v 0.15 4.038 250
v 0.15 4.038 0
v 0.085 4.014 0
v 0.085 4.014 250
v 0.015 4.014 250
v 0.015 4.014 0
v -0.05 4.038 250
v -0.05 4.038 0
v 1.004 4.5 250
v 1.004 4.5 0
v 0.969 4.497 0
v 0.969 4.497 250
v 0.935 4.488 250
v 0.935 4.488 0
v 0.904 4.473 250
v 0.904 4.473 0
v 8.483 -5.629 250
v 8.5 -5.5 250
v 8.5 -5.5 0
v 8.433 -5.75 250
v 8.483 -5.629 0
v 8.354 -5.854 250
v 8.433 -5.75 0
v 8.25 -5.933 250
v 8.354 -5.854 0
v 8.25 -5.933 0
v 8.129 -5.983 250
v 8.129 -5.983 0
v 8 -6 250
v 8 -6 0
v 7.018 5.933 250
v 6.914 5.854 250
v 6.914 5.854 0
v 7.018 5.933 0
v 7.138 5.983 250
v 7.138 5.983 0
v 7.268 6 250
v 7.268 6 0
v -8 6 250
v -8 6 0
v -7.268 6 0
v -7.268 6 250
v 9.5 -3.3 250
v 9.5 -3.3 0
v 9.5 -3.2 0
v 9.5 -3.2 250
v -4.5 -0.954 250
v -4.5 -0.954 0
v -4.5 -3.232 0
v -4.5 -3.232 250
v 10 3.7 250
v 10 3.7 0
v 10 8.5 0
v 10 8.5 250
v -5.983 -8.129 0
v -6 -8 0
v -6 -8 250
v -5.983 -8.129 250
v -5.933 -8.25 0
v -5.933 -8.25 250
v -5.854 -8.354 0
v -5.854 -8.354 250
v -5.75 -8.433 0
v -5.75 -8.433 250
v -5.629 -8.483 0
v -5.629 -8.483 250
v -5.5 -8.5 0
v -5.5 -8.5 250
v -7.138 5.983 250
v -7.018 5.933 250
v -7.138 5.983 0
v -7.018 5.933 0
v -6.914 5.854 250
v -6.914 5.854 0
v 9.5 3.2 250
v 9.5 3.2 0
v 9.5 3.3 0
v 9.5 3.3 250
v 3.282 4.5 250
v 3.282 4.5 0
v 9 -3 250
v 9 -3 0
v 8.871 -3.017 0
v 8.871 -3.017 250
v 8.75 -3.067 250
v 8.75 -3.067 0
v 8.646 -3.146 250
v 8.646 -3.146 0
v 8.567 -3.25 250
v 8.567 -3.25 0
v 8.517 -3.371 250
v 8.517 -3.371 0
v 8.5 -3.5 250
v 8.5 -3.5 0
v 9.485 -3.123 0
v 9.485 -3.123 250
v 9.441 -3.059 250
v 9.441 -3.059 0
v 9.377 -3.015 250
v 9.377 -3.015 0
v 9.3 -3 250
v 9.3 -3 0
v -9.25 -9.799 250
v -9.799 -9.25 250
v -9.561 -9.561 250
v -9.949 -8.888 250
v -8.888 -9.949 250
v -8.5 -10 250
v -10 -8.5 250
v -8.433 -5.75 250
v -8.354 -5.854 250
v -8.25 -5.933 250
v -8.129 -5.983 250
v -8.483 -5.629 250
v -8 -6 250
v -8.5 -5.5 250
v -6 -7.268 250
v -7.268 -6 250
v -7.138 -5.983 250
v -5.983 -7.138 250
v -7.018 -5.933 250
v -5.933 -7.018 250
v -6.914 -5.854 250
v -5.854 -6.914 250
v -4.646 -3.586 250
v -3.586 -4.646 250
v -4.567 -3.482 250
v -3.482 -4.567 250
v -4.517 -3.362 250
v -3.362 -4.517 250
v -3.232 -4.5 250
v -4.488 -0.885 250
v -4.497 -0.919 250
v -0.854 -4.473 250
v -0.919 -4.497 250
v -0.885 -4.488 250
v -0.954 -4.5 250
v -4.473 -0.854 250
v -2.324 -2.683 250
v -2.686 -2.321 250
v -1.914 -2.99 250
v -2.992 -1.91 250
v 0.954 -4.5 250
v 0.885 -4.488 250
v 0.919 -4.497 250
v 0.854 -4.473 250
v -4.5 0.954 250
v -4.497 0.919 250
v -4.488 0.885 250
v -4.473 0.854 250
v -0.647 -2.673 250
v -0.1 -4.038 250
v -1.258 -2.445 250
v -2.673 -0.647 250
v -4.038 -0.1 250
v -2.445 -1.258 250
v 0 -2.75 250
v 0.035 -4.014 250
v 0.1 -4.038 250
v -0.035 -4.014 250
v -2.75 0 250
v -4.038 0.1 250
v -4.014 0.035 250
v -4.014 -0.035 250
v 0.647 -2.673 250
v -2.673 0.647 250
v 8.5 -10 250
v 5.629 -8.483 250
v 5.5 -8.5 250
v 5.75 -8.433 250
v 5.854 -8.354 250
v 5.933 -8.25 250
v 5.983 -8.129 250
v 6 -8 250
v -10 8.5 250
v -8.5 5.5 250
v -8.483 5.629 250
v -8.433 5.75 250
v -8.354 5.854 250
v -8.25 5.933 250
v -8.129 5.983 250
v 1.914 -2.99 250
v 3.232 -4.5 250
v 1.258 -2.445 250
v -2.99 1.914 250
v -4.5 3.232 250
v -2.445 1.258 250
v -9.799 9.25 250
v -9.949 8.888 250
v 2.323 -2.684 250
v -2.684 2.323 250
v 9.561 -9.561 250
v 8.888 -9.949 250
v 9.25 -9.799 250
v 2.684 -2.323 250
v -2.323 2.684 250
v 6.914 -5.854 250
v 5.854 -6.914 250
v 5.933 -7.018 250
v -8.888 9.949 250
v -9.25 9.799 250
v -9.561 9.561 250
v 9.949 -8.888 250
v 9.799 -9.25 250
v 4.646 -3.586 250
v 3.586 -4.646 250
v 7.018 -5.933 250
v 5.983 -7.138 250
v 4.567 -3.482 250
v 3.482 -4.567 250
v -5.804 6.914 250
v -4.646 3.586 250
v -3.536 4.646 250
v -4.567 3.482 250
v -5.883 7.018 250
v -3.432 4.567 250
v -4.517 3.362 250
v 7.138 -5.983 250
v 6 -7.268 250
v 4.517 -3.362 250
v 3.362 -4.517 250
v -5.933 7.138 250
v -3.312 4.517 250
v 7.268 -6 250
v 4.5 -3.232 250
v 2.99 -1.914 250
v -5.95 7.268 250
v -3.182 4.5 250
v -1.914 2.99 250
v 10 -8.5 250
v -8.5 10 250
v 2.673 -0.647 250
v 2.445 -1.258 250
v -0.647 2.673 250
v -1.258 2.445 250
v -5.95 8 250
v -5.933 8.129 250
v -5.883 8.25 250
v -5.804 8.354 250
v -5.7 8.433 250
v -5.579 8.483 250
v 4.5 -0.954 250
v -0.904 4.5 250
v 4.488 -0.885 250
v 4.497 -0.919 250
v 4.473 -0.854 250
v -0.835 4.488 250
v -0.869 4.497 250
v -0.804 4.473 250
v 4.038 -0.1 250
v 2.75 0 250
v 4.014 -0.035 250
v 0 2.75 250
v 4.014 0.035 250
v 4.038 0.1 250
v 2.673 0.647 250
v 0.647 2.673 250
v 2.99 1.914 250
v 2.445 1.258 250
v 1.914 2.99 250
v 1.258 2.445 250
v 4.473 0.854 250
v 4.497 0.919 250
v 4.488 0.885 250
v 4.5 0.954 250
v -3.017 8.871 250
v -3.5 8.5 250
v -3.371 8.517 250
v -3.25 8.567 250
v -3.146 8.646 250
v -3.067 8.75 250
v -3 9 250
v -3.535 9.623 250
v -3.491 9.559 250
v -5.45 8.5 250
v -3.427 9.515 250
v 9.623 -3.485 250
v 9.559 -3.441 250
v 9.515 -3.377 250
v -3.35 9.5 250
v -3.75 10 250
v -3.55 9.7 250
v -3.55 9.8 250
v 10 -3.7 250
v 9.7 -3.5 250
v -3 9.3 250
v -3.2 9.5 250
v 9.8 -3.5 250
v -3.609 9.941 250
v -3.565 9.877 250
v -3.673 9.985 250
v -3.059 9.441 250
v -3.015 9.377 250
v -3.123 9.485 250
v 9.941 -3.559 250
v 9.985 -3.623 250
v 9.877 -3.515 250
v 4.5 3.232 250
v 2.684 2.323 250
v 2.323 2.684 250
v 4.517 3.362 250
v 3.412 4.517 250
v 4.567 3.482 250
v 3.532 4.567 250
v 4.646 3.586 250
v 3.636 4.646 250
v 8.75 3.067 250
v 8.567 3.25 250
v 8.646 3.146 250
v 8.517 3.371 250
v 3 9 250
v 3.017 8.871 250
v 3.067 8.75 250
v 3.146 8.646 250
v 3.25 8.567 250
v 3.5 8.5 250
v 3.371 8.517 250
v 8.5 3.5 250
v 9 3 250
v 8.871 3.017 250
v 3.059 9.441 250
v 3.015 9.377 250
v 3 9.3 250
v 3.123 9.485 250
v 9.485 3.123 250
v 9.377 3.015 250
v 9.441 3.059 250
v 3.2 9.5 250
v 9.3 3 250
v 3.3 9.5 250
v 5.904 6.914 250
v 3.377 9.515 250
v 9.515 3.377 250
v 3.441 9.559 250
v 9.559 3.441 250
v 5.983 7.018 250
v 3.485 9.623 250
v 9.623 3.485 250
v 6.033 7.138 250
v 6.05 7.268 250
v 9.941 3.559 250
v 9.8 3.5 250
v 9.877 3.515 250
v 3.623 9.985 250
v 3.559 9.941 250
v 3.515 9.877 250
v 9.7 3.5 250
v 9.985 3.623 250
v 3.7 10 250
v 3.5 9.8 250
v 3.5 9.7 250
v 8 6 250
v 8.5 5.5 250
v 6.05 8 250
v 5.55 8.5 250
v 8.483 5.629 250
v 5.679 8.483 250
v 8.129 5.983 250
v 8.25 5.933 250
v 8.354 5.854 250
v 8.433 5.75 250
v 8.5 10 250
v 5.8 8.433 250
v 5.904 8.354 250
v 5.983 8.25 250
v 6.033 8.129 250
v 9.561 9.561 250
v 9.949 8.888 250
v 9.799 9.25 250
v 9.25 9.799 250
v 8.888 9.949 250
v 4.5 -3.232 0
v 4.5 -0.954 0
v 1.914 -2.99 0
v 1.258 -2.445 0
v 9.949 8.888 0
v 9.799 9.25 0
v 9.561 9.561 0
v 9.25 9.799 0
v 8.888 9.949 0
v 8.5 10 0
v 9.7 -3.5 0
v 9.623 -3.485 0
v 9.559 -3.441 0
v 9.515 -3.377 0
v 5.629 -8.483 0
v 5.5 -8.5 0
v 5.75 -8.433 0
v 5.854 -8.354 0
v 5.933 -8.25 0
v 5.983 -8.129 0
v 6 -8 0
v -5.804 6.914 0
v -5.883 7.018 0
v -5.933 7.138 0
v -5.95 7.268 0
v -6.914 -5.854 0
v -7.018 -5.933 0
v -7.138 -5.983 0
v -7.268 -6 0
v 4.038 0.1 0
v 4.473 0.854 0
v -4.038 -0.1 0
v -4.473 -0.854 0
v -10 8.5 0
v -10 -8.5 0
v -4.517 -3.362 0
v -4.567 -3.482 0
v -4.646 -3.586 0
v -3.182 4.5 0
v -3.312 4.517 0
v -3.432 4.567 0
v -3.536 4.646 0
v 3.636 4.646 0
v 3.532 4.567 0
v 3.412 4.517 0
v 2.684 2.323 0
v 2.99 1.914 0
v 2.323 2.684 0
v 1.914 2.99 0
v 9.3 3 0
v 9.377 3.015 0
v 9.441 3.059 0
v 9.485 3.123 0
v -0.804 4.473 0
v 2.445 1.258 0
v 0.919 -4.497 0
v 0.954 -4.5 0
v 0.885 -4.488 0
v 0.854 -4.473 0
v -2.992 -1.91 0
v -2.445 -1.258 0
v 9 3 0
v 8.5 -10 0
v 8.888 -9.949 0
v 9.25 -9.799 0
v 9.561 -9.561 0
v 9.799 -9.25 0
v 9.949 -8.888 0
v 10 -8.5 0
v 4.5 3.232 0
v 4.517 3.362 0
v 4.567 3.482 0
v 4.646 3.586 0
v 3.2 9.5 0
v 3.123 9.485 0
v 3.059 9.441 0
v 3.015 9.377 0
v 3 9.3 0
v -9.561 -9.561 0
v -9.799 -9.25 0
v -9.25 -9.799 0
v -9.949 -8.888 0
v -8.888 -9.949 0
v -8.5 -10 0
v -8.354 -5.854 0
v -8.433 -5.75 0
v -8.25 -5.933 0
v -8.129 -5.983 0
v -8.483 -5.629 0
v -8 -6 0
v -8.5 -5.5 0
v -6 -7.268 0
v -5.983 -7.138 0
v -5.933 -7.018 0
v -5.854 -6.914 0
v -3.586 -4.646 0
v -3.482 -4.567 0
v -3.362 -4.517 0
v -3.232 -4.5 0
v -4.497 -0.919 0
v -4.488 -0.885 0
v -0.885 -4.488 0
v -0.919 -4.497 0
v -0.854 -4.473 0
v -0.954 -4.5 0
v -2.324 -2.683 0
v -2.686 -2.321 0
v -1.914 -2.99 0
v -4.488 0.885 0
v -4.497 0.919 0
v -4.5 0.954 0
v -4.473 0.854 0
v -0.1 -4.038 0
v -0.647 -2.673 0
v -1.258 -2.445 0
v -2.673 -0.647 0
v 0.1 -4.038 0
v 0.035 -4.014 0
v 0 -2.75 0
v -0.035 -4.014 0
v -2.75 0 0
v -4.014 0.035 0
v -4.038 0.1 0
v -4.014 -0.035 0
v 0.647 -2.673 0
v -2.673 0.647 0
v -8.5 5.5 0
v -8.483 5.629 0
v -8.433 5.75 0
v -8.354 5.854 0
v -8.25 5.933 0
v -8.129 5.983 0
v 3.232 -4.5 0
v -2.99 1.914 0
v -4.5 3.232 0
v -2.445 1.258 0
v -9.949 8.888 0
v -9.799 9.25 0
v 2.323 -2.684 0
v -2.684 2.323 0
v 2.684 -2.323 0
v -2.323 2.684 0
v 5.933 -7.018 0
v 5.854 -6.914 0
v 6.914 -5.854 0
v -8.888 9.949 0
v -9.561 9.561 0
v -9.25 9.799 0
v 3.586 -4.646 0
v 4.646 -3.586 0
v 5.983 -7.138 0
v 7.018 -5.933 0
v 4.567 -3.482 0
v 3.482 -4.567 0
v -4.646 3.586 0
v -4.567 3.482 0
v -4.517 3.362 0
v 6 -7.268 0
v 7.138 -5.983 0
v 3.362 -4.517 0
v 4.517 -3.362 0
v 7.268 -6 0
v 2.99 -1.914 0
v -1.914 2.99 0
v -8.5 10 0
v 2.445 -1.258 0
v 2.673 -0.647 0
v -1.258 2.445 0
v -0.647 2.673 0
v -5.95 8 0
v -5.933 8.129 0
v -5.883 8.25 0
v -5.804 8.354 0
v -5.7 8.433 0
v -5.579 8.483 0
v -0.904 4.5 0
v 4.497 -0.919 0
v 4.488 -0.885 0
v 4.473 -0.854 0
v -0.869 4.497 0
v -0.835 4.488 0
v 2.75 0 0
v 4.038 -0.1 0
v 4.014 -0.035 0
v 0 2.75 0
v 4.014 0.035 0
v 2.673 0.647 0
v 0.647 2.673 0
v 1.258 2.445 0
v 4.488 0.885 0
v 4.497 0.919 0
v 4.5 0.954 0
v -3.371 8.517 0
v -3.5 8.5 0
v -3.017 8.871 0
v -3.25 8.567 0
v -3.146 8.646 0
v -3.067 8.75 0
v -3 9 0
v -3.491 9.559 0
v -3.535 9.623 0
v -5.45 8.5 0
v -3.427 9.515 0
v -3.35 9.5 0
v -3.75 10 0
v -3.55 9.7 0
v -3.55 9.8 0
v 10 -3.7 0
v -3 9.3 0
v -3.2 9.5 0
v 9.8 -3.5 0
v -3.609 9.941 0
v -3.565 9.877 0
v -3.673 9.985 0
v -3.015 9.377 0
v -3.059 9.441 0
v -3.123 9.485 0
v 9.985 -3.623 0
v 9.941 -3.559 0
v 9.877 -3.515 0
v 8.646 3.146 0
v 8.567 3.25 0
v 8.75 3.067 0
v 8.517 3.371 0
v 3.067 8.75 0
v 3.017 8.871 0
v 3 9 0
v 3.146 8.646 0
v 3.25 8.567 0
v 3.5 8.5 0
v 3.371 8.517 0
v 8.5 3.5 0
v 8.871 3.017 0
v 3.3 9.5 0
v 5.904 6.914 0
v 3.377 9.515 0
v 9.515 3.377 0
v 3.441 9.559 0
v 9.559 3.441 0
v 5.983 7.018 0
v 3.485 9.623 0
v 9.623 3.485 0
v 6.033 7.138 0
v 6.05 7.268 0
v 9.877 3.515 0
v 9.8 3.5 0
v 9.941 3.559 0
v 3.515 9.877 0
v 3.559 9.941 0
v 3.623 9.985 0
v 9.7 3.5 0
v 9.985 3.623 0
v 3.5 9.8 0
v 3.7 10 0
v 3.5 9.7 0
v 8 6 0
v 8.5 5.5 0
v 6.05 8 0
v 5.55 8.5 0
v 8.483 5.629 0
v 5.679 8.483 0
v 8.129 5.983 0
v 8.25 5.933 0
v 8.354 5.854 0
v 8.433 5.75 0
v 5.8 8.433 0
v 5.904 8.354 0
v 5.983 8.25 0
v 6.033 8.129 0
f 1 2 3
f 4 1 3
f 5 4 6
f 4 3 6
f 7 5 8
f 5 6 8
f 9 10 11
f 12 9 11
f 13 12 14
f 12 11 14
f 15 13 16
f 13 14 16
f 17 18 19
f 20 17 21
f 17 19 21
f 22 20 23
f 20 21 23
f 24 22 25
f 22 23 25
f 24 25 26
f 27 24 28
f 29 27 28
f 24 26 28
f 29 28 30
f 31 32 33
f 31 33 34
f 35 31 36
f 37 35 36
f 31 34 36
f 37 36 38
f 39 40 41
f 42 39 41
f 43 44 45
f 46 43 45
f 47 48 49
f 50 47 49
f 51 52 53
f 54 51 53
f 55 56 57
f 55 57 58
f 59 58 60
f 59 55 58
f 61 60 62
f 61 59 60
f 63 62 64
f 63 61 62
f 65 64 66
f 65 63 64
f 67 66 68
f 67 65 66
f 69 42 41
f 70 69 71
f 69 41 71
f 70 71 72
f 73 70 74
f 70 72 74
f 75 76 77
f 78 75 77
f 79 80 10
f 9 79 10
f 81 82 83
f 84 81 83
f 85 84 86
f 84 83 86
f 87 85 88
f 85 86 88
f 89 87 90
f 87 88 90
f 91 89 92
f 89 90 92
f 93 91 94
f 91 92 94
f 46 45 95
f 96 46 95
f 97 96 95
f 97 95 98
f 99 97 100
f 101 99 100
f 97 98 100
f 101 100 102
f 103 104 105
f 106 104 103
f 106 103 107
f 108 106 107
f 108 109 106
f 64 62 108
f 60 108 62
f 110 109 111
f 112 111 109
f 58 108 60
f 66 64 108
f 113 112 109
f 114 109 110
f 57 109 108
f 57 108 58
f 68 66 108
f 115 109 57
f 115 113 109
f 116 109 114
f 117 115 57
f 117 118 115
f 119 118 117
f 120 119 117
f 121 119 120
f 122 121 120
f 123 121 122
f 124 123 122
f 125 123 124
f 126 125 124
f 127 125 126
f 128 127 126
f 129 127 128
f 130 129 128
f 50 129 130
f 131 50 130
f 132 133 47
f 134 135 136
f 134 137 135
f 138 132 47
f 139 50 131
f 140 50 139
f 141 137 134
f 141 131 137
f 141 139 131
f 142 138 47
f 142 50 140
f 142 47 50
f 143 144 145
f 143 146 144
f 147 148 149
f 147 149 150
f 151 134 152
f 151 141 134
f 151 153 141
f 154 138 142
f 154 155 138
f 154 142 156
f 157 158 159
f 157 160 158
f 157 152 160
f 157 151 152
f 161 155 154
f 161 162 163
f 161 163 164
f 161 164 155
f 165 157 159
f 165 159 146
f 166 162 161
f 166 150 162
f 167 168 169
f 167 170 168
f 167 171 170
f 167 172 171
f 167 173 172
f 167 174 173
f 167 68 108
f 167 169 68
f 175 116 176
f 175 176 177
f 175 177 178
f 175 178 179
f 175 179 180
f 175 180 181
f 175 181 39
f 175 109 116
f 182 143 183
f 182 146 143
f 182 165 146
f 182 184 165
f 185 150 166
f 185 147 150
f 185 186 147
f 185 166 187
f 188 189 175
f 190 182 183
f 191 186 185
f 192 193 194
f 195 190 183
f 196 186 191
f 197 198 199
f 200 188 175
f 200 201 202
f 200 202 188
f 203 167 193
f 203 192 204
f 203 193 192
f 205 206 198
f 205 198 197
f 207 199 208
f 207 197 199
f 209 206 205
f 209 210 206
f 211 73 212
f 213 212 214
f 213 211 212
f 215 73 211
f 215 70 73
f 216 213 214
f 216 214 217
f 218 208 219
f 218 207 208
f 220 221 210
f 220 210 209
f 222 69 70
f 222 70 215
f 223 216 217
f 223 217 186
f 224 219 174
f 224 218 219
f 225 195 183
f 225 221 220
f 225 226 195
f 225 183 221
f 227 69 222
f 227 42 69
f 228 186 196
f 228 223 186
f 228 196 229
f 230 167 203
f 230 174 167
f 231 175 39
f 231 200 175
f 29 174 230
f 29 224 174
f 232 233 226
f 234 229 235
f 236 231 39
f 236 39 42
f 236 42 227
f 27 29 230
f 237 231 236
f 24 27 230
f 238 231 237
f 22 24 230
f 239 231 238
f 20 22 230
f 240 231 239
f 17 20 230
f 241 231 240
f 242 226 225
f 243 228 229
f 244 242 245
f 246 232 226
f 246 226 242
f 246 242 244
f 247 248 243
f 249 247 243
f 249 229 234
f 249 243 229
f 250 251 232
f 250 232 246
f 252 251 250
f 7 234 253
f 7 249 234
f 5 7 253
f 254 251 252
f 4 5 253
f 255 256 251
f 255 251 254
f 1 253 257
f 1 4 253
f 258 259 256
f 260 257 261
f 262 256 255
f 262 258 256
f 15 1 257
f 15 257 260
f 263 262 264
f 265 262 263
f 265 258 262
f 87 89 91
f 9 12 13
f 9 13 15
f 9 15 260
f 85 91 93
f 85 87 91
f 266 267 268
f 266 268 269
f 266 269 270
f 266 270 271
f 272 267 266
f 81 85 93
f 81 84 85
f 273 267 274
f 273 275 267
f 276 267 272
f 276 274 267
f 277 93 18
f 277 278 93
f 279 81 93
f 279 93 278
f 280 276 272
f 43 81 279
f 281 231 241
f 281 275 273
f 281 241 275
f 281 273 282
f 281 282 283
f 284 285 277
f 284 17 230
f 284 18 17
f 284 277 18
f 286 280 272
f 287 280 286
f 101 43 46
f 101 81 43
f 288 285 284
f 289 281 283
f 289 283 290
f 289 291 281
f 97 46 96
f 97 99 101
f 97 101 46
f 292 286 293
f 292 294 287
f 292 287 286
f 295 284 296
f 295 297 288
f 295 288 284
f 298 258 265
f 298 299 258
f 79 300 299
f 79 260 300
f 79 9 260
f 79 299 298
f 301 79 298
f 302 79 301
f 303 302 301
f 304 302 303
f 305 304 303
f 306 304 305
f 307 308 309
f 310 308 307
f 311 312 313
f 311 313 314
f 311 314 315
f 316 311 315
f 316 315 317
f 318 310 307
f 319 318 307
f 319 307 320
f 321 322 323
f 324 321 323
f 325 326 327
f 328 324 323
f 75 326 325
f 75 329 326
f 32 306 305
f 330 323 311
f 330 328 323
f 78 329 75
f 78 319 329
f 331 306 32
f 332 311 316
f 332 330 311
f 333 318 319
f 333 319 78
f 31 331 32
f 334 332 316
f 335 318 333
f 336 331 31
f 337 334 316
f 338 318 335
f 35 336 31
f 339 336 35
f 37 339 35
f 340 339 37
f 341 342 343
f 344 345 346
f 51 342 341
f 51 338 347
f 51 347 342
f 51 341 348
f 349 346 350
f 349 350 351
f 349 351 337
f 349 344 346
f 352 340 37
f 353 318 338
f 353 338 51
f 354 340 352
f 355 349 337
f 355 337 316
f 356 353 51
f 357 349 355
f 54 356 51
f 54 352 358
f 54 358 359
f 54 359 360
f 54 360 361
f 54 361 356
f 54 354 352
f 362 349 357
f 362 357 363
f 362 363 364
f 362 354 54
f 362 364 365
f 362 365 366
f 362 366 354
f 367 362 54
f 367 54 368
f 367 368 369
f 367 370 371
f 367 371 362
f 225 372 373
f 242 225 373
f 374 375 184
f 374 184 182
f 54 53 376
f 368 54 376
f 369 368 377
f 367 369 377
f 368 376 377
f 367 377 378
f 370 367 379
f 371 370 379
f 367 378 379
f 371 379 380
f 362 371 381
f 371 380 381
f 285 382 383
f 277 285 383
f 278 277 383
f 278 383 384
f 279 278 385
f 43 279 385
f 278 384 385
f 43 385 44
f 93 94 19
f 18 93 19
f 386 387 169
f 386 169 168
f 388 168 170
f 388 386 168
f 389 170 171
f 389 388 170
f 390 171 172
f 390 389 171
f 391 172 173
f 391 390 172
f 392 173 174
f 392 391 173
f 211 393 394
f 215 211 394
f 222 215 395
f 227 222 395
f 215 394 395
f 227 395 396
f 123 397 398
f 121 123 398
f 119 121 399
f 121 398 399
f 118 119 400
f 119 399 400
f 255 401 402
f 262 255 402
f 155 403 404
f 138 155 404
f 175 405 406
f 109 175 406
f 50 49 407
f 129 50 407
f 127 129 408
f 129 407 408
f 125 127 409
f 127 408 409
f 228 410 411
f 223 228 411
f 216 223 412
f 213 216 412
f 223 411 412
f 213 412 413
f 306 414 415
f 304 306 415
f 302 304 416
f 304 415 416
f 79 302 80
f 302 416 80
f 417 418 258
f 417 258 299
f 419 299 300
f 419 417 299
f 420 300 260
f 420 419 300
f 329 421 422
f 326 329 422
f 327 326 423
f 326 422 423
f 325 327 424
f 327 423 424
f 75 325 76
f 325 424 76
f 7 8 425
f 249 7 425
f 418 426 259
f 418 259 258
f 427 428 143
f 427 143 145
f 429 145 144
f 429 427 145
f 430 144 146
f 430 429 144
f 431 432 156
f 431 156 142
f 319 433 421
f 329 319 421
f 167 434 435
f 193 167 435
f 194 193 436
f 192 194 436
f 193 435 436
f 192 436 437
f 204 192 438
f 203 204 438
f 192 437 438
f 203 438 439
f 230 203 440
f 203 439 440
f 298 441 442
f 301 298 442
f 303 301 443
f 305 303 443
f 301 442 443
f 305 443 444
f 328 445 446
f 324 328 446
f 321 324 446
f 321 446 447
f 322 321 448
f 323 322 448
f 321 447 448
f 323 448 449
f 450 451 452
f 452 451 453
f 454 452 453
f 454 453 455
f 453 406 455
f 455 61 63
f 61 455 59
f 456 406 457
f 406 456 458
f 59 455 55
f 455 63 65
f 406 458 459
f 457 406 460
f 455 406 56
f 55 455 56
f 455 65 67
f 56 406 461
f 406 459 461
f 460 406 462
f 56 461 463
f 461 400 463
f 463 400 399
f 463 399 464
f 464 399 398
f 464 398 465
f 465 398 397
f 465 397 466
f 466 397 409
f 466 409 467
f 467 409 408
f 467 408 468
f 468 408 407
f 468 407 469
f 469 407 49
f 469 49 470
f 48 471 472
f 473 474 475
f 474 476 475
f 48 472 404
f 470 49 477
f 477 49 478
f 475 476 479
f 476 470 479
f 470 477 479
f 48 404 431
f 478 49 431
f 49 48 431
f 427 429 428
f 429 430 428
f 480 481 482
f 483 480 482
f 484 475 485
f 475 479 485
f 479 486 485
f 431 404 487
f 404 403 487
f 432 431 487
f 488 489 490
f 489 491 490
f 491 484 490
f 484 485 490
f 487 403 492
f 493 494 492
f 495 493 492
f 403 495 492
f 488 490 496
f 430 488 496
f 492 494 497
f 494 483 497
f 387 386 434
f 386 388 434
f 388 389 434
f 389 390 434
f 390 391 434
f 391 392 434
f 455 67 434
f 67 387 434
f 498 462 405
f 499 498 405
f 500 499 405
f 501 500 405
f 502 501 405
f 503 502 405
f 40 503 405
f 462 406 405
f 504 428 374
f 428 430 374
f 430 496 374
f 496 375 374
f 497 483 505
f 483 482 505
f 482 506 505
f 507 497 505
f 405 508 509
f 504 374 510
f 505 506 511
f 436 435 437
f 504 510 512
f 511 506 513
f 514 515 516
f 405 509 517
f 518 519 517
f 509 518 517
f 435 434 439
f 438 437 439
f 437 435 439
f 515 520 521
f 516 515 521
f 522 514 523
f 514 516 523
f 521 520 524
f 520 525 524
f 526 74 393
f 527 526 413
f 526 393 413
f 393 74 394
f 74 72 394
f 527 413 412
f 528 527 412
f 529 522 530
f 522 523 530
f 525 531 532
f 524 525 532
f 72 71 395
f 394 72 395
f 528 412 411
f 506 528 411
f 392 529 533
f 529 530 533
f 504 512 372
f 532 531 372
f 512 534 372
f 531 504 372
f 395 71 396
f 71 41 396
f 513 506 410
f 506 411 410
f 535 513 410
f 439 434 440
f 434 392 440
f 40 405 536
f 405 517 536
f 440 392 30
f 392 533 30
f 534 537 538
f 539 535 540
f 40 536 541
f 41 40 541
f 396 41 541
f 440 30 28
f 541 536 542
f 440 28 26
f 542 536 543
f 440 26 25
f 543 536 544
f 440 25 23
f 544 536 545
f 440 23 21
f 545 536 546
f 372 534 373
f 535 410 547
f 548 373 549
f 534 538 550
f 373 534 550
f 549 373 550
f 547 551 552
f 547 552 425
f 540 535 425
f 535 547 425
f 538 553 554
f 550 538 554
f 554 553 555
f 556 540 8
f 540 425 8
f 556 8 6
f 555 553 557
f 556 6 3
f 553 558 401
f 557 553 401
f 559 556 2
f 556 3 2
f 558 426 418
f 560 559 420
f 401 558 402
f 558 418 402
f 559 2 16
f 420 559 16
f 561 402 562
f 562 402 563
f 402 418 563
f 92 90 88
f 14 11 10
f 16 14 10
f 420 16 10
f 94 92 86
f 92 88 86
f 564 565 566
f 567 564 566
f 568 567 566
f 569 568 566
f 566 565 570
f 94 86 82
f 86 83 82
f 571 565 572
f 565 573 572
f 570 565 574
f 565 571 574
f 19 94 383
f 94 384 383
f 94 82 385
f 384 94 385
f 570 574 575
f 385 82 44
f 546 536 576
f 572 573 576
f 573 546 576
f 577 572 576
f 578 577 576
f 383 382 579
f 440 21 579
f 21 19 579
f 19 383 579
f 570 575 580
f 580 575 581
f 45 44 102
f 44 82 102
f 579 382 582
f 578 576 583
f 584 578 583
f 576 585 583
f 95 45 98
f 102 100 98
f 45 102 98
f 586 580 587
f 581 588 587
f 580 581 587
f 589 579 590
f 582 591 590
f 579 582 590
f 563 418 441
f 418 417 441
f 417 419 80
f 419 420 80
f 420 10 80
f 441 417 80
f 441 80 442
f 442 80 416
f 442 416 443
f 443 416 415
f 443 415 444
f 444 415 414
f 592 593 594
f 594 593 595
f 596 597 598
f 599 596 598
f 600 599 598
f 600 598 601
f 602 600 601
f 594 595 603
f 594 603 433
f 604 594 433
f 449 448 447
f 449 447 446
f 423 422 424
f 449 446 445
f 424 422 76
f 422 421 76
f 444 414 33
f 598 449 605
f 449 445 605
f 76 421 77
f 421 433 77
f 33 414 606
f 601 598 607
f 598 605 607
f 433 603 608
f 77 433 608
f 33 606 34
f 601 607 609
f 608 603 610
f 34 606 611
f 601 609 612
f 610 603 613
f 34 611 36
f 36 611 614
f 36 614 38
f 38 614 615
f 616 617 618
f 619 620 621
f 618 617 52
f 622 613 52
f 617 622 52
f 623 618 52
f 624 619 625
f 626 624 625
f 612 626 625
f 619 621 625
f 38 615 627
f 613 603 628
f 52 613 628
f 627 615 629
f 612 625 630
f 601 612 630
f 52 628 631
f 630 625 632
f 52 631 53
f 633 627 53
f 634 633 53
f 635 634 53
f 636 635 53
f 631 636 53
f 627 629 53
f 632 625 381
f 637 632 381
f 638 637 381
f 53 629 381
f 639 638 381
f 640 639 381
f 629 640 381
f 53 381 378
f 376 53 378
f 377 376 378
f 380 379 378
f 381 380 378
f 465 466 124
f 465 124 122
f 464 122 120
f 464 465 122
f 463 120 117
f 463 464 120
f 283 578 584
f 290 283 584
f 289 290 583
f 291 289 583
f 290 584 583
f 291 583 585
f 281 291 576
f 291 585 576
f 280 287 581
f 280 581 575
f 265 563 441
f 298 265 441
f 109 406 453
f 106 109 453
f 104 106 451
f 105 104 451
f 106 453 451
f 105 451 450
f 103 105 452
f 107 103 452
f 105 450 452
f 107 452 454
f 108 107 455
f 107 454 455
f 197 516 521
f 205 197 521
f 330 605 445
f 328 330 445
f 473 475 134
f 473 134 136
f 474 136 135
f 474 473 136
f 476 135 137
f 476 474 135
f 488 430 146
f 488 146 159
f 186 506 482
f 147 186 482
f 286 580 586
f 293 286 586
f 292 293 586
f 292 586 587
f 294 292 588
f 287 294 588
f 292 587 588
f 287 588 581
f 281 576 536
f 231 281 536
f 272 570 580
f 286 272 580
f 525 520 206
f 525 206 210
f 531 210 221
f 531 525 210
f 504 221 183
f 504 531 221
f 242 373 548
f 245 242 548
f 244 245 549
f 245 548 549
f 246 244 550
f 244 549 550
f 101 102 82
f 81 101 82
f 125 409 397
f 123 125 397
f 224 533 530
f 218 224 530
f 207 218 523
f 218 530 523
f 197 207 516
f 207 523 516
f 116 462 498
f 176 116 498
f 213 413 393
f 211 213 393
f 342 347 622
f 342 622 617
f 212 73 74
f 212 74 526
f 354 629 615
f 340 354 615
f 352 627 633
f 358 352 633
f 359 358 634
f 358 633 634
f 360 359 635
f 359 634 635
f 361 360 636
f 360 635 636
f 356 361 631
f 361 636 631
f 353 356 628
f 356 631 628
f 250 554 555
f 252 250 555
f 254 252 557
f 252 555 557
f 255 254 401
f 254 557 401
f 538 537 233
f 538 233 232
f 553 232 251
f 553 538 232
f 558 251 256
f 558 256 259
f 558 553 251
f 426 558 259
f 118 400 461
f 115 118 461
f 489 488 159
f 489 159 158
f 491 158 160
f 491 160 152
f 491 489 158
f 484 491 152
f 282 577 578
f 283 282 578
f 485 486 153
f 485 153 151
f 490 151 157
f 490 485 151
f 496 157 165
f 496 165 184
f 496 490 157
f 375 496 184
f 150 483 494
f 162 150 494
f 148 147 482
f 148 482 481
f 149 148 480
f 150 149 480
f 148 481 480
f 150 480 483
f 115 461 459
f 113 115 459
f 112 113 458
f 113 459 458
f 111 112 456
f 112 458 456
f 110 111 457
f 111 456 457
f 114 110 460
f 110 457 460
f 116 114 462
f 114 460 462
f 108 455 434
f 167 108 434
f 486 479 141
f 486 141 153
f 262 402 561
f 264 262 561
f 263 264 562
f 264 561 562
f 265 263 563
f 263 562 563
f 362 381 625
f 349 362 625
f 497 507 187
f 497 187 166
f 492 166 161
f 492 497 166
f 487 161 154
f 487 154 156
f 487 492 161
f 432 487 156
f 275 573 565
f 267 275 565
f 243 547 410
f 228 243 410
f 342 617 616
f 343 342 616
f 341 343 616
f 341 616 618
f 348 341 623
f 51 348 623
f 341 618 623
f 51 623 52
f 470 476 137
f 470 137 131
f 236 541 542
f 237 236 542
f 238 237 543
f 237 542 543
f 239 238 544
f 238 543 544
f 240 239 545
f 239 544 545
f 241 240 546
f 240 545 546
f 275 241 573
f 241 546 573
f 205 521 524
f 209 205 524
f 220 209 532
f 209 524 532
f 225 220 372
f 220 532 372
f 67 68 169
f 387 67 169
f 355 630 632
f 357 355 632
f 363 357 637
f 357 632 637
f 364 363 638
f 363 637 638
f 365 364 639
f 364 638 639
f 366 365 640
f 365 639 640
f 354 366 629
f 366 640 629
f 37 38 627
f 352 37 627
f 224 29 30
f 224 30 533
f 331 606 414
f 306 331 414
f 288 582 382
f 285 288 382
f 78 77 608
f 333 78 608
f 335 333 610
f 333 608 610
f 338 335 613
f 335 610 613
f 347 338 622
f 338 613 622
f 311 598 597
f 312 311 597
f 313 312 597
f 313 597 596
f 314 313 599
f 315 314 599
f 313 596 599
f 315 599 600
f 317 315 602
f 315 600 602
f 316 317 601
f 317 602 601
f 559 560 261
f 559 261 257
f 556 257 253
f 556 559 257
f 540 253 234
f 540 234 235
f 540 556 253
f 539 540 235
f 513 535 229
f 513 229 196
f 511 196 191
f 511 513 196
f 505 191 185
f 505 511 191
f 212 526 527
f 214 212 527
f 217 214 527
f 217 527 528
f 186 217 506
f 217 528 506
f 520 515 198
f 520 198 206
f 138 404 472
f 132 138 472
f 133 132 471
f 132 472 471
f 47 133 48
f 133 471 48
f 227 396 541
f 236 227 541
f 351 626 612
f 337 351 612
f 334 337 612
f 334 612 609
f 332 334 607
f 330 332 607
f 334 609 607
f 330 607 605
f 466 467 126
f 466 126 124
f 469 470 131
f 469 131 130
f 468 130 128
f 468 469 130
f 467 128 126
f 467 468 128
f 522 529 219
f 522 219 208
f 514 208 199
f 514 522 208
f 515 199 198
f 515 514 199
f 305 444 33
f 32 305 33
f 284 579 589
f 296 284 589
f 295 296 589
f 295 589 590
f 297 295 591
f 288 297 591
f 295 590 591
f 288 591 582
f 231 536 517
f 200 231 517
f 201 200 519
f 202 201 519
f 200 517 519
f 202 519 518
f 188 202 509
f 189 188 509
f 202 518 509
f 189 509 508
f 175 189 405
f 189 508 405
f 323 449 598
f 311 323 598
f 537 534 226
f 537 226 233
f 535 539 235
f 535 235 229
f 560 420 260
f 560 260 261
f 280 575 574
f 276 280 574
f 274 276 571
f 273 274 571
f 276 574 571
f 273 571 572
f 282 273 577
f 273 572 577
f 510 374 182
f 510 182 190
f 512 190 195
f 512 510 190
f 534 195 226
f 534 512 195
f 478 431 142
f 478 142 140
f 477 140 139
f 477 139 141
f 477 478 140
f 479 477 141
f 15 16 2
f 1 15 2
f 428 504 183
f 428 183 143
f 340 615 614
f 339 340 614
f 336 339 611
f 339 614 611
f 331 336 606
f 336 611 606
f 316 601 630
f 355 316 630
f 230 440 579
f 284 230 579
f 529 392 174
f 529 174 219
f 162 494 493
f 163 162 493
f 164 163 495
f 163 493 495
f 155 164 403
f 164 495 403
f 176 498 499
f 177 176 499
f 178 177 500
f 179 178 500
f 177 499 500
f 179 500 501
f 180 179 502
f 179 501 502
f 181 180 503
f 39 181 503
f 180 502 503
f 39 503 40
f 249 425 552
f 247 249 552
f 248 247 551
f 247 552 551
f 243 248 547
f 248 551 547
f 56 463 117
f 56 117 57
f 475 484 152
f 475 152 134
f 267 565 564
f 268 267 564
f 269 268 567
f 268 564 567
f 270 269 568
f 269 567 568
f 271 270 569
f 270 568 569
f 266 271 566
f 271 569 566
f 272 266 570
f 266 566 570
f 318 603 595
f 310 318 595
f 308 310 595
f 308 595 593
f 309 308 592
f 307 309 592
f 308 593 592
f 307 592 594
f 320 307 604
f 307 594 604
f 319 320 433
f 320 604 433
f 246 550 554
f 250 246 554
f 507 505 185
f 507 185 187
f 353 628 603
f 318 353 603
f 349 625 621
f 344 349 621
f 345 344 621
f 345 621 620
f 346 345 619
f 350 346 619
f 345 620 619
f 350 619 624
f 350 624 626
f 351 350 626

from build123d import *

# Parameters (mm, degrees)
EXTRUDE1_DEPTH = 250


with BuildPart() as part:
    # Sketch1 → Extrude1 (new body)
    with BuildSketch(Plane.XY):
        with BuildLine():
            Line((-8.5, -10), (8.5, -10))
            ThreePointArc((8.5, -10), (9.560660172, -9.560660172), (10, -8.5))
            Line((10, -8.5), (10, -3.7))
            ThreePointArc((10, -3.7), (9.941421356, -3.558578644), (9.8, -3.5))
            Line((9.8, -3.5), (9.7, -3.5))
            ThreePointArc((9.7, -3.5), (9.558578644, -3.441421356), (9.5, -3.3))
            Line((9.5, -3.3), (9.5, -3.2))
            ThreePointArc((9.5, -3.2), (9.441421356, -3.058578644), (9.3, -3))
            Line((9.3, -3), (9, -3))
            ThreePointArc((9, -3), (8.646446609, -3.146446609), (8.5, -3.5))
            Line((8.5, -3.5), (8.5, -5.500000208))
            ThreePointArc((8.5, -5.500000208), (8.353553391, -5.853553598), (8, -6.000000208))
            Line((8, -6.000000208), (7.267767022, -6.000000208))
            ThreePointArc((7.267767022, -6.000000208), (7.076425294, -5.961939969), (6.914213614, -5.853553581))
            Line((6.914213614, -5.853553581), (4.646446828, -3.585786575))
            ThreePointArc((4.646446828, -3.585786575), (4.538060465, -3.423574906), (4.500000236, -3.232233201))
            Line((4.500000236, -3.232233201), (4.500000236, -0.953589838))
            ThreePointArc((4.500000236, -0.953589838), (4.493185401, -0.901826029), (4.473205317, -0.853589838))
            Line((4.473205317, -0.853589838), (4.038120021, -0.1))
            ThreePointArc((4.038120021, -0.1), (4.011325101, 0), (4.038120021, 0.1))
            Line((4.038120021, 0.1), (4.473205317, 0.853589838))
            ThreePointArc((4.473205317, 0.853589838), (4.493185401, 0.901826029), (4.500000236, 0.953589838))
            Line((4.500000236, 0.953589838), (4.500000236, 3.232233262))
            ThreePointArc((4.500000236, 3.232233262), (4.538060467, 3.423574973), (4.646446837, 3.585786644))
            Line((4.646446837, 3.585786644), (6.914213678, 5.853553596))
            ThreePointArc((6.914213678, 5.853553596), (7.076425355, 5.961939978), (7.267767077, 6.000000214))
            Line((7.267767077, 6.000000214), (8.000000112, 6.000000214))
            ThreePointArc((8.000000112, 6.000000214), (8.353553502, 5.853553604), (8.500000112, 5.500000214))
            Line((8.500000112, 5.500000214), (8.500000112, 3.5))
            ThreePointArc((8.500000112, 3.5), (8.646446721, 3.146446609), (9.000000112, 3))
            Line((9.000000112, 3), (9.300000112, 3))
            ThreePointArc((9.300000112, 3), (9.441421468, 3.058578644), (9.500000112, 3.2))
            Line((9.500000112, 3.2), (9.500000112, 3.3))
            ThreePointArc((9.500000112, 3.3), (9.558578756, 3.441421356), (9.700000112, 3.5))
            Line((9.700000112, 3.5), (9.8, 3.5))
            ThreePointArc((9.8, 3.5), (9.941421356, 3.558578644), (10, 3.7))
            Line((10, 3.7), (10, 8.5))
            ThreePointArc((10, 8.5), (9.560660172, 9.560660172), (8.5, 10))
            Line((8.5, 10), (3.7, 10))
            ThreePointArc((3.7, 10), (3.558578644, 9.941421356), (3.5, 9.8))
            Line((3.5, 9.8), (3.5, 9.7))
            ThreePointArc((3.5, 9.7), (3.441421356, 9.558578644), (3.3, 9.5))
            Line((3.3, 9.5), (3.2, 9.5))
            ThreePointArc((3.2, 9.5), (3.058578644, 9.441421356), (3, 9.3))
            Line((3, 9.3), (3, 9.000000069))
            ThreePointArc((3, 9.000000069), (3.146446609, 8.646446678), (3.5, 8.500000069))
            Line((3.5, 8.500000069), (5.550000287, 8.500000069))
            ThreePointArc((5.550000287, 8.500000069), (5.903553677, 8.353553459), (6.050000287, 8.000000069))
            Line((6.050000287, 8.000000069), (6.050000287, 7.267766898))
            ThreePointArc((6.050000287, 7.267766898), (6.011940051, 7.076425176), (5.903553669, 6.914213499))
            Line((5.903553669, 6.914213499), (3.635786717, 4.646446658))
            ThreePointArc((3.635786717, 4.646446658), (3.473575046, 4.538060288), (3.282233335, 4.500000057))
            Line((3.282233335, 4.500000057), (1.003589985, 4.500000057))
            ThreePointArc((1.003589985, 4.500000057), (0.951826176, 4.493185222), (0.903589985, 4.473205138))
            Line((0.903589985, 4.473205138), (0.150000146, 4.038119841))
            ThreePointArc((0.150000146, 4.038119841), (0.050000146, 4.011324922), (-0.049999854, 4.038119841))
            Line((-0.049999854, 4.038119841), (-0.803589692, 4.473205138))
            ThreePointArc((-0.803589692, 4.473205138), (-0.851825883, 4.493185222), (-0.903589692, 4.500000057))
            Line((-0.903589692, 4.500000057), (-3.182233104, 4.500000057))
            ThreePointArc((-3.182233104, 4.500000057), (-3.37357482, 4.538060291), (-3.535786494, 4.646446666))
            Line((-3.535786494, 4.646446666), (-5.803553391, 6.914213562))
            ThreePointArc((-5.803553391, 6.914213562), (-5.911939766, 7.076425237), (-5.95, 7.267766953))
            Line((-5.95, 7.267766953), (-5.95, 8))
            ThreePointArc((-5.95, 8), (-5.803553391, 8.353553391), (-5.45, 8.5))
            Line((-5.45, 8.5), (-3.5, 8.5))
            ThreePointArc((-3.5, 8.5), (-3.146446609, 8.646446609), (-3, 9))
            Line((-3, 9), (-3, 9.3))
            ThreePointArc((-3, 9.3), (-3.058578644, 9.441421356), (-3.2, 9.5))
            Line((-3.2, 9.5), (-3.35, 9.5))
            ThreePointArc((-3.35, 9.5), (-3.491421356, 9.558578644), (-3.55, 9.7))
            Line((-3.55, 9.7), (-3.55, 9.8))
            ThreePointArc((-3.55, 9.8), (-3.608578644, 9.941421356), (-3.75, 10))
            Line((-3.75, 10), (-8.5, 10))
            ThreePointArc((-8.5, 10), (-9.560660172, 9.560660172), (-10, 8.5))
            Line((-10, 8.5), (-10, -8.5))
            ThreePointArc((-10, -8.5), (-9.560660172, -9.560660172), (-8.5, -10))
        make_face()
        with BuildLine():
            Line((-5.500000147, -8.500000123), (5.500000242, -8.500000123))
            ThreePointArc((5.500000242, -8.500000123), (5.853553633, -8.353553514), (6.000000242, -8.000000123))
            Line((6.000000242, -8.000000123), (6.000000242, -7.267766878))
            ThreePointArc((6.000000242, -7.267766878), (5.961940006, -7.076425156), (5.853553624, -6.914213479))
            Line((5.853553624, -6.914213479), (3.585786637, -4.646446602))
            ThreePointArc((3.585786637, -4.646446602), (3.423574966, -4.538060233), (3.232233255, -4.500000001))
            Line((3.232233255, -4.500000001), (0.953589836, -4.500000001))
            ThreePointArc((0.953589836, -4.500000001), (0.901826025, -4.493185166), (0.853589832, -4.47320508))
            Line((0.853589832, -4.47320508), (0.100000004, -4.038119765))
            ThreePointArc((0.100000004, -4.038119765), (5e-09, -4.011324843), (-0.099999996, -4.03811976))
            Line((-0.099999996, -4.03811976), (-0.853589845, -4.473205038))
            ThreePointArc((-0.853589845, -4.473205038), (-0.901826034, -4.493185121), (-0.953589841, -4.499999955))
            Line((-0.953589841, -4.499999955), (-3.232233196, -4.499999955))
            ThreePointArc((-3.232233196, -4.499999955), (-3.423574907, -4.538060186), (-3.585786578, -4.646446556))
            Line((-3.585786578, -4.646446556), (-5.853553529, -6.914213397))
            ThreePointArc((-5.853553529, -6.914213397), (-5.961939911, -7.076425074), (-6.000000147, -7.267766796))
            Line((-6.000000147, -7.267766796), (-6.000000147, -8.000000123))
            ThreePointArc((-6.000000147, -8.000000123), (-5.853553538, -8.353553514), (-5.500000147, -8.500000123))
        make_face(mode=Mode.SUBTRACT)
        with BuildLine():
            Line((1.258185317, -2.445295423), (1.913894874, -2.989641056))
            ThreePointArc((1.913894874, -2.989641056), (2.510074363, -2.510074485), (2.989640962, -1.91389502))
            Line((2.989640962, -1.91389502), (2.445295362, -1.258185436))
            ThreePointArc((2.445295362, -1.258185436), (2.75, -6.7e-08), (2.445295423, 1.258185317))
            Line((2.445295423, 1.258185317), (2.989641056, 1.913894874))
            ThreePointArc((2.989641056, 1.913894874), (2.510074485, 2.510074363), (1.91389502, 2.989640962))
            Line((1.91389502, 2.989640962), (1.258185436, 2.445295362))
            ThreePointArc((1.258185436, 2.445295362), (6.7e-08, 2.75), (-1.258185317, 2.445295423))
            Line((-1.258185317, 2.445295423), (-1.913894874, 2.989641056))
            ThreePointArc((-1.913894874, 2.989641056), (-2.510074363, 2.510074485), (-2.989640962, 1.91389502))
            Line((-2.989640962, 1.91389502), (-2.445295362, 1.258185436))
            ThreePointArc((-2.445295362, 1.258185436), (-2.75, 6.7e-08), (-2.445295423, -1.258185317))
            Line((-2.445295423, -1.258185317), (-2.992174953, -1.909930962))
            ThreePointArc((-2.992174953, -1.909930962), (-2.511737261, -2.508410485), (-1.91389502, -2.989640962))
            Line((-1.91389502, -2.989640962), (-1.258185436, -2.445295362))
            ThreePointArc((-1.258185436, -2.445295362), (-6.7e-08, -2.75), (1.258185317, -2.445295423))
        make_face(mode=Mode.SUBTRACT)
        with BuildLine():
            Line((-8.5, -5.5), (-8.5, 5.50000039))
            ThreePointArc((-8.5, 5.50000039), (-8.353553351, 5.853553875), (-7.999999866, 6.000000524))
            Line((-7.999999866, 6.000000524), (-7.267766819, 6.000000524))
            ThreePointArc((-7.267766819, 6.000000524), (-7.076425092, 5.961940285), (-6.914213411, 5.853553897))
            Line((-6.914213411, 5.853553897), (-4.646446626, 3.585786891))
            ThreePointArc((-4.646446626, 3.585786891), (-4.538060262, 3.423575222), (-4.500000033, 3.232233517))
            Line((-4.500000033, 3.232233517), (-4.500000033, 0.953590154))
            ThreePointArc((-4.500000033, 0.953590154), (-4.493185199, 0.901826345), (-4.473205114, 0.853590154))
            Line((-4.473205114, 0.853590154), (-4.038119781, 0.100000251))
            ThreePointArc((-4.038119781, 0.100000251), (-4.011324861, 2.51e-07), (-4.038119781, -0.099999749))
            Line((-4.038119781, -0.099999749), (-4.473205138, -0.853589692))
            ThreePointArc((-4.473205138, -0.853589692), (-4.493185222, -0.901825883), (-4.500000057, -0.953589692))
            Line((-4.500000057, -0.953589692), (-4.500000057, -3.232233104))
            ThreePointArc((-4.500000057, -3.232233104), (-4.538060291, -3.42357482), (-4.646446666, -3.585786494))
            Line((-4.646446666, -3.585786494), (-6.914213562, -5.853553391))
            ThreePointArc((-6.914213562, -5.853553391), (-7.076425237, -5.961939766), (-7.267766953, -6))
            Line((-7.267766953, -6), (-8, -6))
            ThreePointArc((-8, -6), (-8.353553391, -5.853553391), (-8.5, -5.5))
        make_face(mode=Mode.SUBTRACT)
    extrude(amount=EXTRUDE1_DEPTH)


solid = part.part
